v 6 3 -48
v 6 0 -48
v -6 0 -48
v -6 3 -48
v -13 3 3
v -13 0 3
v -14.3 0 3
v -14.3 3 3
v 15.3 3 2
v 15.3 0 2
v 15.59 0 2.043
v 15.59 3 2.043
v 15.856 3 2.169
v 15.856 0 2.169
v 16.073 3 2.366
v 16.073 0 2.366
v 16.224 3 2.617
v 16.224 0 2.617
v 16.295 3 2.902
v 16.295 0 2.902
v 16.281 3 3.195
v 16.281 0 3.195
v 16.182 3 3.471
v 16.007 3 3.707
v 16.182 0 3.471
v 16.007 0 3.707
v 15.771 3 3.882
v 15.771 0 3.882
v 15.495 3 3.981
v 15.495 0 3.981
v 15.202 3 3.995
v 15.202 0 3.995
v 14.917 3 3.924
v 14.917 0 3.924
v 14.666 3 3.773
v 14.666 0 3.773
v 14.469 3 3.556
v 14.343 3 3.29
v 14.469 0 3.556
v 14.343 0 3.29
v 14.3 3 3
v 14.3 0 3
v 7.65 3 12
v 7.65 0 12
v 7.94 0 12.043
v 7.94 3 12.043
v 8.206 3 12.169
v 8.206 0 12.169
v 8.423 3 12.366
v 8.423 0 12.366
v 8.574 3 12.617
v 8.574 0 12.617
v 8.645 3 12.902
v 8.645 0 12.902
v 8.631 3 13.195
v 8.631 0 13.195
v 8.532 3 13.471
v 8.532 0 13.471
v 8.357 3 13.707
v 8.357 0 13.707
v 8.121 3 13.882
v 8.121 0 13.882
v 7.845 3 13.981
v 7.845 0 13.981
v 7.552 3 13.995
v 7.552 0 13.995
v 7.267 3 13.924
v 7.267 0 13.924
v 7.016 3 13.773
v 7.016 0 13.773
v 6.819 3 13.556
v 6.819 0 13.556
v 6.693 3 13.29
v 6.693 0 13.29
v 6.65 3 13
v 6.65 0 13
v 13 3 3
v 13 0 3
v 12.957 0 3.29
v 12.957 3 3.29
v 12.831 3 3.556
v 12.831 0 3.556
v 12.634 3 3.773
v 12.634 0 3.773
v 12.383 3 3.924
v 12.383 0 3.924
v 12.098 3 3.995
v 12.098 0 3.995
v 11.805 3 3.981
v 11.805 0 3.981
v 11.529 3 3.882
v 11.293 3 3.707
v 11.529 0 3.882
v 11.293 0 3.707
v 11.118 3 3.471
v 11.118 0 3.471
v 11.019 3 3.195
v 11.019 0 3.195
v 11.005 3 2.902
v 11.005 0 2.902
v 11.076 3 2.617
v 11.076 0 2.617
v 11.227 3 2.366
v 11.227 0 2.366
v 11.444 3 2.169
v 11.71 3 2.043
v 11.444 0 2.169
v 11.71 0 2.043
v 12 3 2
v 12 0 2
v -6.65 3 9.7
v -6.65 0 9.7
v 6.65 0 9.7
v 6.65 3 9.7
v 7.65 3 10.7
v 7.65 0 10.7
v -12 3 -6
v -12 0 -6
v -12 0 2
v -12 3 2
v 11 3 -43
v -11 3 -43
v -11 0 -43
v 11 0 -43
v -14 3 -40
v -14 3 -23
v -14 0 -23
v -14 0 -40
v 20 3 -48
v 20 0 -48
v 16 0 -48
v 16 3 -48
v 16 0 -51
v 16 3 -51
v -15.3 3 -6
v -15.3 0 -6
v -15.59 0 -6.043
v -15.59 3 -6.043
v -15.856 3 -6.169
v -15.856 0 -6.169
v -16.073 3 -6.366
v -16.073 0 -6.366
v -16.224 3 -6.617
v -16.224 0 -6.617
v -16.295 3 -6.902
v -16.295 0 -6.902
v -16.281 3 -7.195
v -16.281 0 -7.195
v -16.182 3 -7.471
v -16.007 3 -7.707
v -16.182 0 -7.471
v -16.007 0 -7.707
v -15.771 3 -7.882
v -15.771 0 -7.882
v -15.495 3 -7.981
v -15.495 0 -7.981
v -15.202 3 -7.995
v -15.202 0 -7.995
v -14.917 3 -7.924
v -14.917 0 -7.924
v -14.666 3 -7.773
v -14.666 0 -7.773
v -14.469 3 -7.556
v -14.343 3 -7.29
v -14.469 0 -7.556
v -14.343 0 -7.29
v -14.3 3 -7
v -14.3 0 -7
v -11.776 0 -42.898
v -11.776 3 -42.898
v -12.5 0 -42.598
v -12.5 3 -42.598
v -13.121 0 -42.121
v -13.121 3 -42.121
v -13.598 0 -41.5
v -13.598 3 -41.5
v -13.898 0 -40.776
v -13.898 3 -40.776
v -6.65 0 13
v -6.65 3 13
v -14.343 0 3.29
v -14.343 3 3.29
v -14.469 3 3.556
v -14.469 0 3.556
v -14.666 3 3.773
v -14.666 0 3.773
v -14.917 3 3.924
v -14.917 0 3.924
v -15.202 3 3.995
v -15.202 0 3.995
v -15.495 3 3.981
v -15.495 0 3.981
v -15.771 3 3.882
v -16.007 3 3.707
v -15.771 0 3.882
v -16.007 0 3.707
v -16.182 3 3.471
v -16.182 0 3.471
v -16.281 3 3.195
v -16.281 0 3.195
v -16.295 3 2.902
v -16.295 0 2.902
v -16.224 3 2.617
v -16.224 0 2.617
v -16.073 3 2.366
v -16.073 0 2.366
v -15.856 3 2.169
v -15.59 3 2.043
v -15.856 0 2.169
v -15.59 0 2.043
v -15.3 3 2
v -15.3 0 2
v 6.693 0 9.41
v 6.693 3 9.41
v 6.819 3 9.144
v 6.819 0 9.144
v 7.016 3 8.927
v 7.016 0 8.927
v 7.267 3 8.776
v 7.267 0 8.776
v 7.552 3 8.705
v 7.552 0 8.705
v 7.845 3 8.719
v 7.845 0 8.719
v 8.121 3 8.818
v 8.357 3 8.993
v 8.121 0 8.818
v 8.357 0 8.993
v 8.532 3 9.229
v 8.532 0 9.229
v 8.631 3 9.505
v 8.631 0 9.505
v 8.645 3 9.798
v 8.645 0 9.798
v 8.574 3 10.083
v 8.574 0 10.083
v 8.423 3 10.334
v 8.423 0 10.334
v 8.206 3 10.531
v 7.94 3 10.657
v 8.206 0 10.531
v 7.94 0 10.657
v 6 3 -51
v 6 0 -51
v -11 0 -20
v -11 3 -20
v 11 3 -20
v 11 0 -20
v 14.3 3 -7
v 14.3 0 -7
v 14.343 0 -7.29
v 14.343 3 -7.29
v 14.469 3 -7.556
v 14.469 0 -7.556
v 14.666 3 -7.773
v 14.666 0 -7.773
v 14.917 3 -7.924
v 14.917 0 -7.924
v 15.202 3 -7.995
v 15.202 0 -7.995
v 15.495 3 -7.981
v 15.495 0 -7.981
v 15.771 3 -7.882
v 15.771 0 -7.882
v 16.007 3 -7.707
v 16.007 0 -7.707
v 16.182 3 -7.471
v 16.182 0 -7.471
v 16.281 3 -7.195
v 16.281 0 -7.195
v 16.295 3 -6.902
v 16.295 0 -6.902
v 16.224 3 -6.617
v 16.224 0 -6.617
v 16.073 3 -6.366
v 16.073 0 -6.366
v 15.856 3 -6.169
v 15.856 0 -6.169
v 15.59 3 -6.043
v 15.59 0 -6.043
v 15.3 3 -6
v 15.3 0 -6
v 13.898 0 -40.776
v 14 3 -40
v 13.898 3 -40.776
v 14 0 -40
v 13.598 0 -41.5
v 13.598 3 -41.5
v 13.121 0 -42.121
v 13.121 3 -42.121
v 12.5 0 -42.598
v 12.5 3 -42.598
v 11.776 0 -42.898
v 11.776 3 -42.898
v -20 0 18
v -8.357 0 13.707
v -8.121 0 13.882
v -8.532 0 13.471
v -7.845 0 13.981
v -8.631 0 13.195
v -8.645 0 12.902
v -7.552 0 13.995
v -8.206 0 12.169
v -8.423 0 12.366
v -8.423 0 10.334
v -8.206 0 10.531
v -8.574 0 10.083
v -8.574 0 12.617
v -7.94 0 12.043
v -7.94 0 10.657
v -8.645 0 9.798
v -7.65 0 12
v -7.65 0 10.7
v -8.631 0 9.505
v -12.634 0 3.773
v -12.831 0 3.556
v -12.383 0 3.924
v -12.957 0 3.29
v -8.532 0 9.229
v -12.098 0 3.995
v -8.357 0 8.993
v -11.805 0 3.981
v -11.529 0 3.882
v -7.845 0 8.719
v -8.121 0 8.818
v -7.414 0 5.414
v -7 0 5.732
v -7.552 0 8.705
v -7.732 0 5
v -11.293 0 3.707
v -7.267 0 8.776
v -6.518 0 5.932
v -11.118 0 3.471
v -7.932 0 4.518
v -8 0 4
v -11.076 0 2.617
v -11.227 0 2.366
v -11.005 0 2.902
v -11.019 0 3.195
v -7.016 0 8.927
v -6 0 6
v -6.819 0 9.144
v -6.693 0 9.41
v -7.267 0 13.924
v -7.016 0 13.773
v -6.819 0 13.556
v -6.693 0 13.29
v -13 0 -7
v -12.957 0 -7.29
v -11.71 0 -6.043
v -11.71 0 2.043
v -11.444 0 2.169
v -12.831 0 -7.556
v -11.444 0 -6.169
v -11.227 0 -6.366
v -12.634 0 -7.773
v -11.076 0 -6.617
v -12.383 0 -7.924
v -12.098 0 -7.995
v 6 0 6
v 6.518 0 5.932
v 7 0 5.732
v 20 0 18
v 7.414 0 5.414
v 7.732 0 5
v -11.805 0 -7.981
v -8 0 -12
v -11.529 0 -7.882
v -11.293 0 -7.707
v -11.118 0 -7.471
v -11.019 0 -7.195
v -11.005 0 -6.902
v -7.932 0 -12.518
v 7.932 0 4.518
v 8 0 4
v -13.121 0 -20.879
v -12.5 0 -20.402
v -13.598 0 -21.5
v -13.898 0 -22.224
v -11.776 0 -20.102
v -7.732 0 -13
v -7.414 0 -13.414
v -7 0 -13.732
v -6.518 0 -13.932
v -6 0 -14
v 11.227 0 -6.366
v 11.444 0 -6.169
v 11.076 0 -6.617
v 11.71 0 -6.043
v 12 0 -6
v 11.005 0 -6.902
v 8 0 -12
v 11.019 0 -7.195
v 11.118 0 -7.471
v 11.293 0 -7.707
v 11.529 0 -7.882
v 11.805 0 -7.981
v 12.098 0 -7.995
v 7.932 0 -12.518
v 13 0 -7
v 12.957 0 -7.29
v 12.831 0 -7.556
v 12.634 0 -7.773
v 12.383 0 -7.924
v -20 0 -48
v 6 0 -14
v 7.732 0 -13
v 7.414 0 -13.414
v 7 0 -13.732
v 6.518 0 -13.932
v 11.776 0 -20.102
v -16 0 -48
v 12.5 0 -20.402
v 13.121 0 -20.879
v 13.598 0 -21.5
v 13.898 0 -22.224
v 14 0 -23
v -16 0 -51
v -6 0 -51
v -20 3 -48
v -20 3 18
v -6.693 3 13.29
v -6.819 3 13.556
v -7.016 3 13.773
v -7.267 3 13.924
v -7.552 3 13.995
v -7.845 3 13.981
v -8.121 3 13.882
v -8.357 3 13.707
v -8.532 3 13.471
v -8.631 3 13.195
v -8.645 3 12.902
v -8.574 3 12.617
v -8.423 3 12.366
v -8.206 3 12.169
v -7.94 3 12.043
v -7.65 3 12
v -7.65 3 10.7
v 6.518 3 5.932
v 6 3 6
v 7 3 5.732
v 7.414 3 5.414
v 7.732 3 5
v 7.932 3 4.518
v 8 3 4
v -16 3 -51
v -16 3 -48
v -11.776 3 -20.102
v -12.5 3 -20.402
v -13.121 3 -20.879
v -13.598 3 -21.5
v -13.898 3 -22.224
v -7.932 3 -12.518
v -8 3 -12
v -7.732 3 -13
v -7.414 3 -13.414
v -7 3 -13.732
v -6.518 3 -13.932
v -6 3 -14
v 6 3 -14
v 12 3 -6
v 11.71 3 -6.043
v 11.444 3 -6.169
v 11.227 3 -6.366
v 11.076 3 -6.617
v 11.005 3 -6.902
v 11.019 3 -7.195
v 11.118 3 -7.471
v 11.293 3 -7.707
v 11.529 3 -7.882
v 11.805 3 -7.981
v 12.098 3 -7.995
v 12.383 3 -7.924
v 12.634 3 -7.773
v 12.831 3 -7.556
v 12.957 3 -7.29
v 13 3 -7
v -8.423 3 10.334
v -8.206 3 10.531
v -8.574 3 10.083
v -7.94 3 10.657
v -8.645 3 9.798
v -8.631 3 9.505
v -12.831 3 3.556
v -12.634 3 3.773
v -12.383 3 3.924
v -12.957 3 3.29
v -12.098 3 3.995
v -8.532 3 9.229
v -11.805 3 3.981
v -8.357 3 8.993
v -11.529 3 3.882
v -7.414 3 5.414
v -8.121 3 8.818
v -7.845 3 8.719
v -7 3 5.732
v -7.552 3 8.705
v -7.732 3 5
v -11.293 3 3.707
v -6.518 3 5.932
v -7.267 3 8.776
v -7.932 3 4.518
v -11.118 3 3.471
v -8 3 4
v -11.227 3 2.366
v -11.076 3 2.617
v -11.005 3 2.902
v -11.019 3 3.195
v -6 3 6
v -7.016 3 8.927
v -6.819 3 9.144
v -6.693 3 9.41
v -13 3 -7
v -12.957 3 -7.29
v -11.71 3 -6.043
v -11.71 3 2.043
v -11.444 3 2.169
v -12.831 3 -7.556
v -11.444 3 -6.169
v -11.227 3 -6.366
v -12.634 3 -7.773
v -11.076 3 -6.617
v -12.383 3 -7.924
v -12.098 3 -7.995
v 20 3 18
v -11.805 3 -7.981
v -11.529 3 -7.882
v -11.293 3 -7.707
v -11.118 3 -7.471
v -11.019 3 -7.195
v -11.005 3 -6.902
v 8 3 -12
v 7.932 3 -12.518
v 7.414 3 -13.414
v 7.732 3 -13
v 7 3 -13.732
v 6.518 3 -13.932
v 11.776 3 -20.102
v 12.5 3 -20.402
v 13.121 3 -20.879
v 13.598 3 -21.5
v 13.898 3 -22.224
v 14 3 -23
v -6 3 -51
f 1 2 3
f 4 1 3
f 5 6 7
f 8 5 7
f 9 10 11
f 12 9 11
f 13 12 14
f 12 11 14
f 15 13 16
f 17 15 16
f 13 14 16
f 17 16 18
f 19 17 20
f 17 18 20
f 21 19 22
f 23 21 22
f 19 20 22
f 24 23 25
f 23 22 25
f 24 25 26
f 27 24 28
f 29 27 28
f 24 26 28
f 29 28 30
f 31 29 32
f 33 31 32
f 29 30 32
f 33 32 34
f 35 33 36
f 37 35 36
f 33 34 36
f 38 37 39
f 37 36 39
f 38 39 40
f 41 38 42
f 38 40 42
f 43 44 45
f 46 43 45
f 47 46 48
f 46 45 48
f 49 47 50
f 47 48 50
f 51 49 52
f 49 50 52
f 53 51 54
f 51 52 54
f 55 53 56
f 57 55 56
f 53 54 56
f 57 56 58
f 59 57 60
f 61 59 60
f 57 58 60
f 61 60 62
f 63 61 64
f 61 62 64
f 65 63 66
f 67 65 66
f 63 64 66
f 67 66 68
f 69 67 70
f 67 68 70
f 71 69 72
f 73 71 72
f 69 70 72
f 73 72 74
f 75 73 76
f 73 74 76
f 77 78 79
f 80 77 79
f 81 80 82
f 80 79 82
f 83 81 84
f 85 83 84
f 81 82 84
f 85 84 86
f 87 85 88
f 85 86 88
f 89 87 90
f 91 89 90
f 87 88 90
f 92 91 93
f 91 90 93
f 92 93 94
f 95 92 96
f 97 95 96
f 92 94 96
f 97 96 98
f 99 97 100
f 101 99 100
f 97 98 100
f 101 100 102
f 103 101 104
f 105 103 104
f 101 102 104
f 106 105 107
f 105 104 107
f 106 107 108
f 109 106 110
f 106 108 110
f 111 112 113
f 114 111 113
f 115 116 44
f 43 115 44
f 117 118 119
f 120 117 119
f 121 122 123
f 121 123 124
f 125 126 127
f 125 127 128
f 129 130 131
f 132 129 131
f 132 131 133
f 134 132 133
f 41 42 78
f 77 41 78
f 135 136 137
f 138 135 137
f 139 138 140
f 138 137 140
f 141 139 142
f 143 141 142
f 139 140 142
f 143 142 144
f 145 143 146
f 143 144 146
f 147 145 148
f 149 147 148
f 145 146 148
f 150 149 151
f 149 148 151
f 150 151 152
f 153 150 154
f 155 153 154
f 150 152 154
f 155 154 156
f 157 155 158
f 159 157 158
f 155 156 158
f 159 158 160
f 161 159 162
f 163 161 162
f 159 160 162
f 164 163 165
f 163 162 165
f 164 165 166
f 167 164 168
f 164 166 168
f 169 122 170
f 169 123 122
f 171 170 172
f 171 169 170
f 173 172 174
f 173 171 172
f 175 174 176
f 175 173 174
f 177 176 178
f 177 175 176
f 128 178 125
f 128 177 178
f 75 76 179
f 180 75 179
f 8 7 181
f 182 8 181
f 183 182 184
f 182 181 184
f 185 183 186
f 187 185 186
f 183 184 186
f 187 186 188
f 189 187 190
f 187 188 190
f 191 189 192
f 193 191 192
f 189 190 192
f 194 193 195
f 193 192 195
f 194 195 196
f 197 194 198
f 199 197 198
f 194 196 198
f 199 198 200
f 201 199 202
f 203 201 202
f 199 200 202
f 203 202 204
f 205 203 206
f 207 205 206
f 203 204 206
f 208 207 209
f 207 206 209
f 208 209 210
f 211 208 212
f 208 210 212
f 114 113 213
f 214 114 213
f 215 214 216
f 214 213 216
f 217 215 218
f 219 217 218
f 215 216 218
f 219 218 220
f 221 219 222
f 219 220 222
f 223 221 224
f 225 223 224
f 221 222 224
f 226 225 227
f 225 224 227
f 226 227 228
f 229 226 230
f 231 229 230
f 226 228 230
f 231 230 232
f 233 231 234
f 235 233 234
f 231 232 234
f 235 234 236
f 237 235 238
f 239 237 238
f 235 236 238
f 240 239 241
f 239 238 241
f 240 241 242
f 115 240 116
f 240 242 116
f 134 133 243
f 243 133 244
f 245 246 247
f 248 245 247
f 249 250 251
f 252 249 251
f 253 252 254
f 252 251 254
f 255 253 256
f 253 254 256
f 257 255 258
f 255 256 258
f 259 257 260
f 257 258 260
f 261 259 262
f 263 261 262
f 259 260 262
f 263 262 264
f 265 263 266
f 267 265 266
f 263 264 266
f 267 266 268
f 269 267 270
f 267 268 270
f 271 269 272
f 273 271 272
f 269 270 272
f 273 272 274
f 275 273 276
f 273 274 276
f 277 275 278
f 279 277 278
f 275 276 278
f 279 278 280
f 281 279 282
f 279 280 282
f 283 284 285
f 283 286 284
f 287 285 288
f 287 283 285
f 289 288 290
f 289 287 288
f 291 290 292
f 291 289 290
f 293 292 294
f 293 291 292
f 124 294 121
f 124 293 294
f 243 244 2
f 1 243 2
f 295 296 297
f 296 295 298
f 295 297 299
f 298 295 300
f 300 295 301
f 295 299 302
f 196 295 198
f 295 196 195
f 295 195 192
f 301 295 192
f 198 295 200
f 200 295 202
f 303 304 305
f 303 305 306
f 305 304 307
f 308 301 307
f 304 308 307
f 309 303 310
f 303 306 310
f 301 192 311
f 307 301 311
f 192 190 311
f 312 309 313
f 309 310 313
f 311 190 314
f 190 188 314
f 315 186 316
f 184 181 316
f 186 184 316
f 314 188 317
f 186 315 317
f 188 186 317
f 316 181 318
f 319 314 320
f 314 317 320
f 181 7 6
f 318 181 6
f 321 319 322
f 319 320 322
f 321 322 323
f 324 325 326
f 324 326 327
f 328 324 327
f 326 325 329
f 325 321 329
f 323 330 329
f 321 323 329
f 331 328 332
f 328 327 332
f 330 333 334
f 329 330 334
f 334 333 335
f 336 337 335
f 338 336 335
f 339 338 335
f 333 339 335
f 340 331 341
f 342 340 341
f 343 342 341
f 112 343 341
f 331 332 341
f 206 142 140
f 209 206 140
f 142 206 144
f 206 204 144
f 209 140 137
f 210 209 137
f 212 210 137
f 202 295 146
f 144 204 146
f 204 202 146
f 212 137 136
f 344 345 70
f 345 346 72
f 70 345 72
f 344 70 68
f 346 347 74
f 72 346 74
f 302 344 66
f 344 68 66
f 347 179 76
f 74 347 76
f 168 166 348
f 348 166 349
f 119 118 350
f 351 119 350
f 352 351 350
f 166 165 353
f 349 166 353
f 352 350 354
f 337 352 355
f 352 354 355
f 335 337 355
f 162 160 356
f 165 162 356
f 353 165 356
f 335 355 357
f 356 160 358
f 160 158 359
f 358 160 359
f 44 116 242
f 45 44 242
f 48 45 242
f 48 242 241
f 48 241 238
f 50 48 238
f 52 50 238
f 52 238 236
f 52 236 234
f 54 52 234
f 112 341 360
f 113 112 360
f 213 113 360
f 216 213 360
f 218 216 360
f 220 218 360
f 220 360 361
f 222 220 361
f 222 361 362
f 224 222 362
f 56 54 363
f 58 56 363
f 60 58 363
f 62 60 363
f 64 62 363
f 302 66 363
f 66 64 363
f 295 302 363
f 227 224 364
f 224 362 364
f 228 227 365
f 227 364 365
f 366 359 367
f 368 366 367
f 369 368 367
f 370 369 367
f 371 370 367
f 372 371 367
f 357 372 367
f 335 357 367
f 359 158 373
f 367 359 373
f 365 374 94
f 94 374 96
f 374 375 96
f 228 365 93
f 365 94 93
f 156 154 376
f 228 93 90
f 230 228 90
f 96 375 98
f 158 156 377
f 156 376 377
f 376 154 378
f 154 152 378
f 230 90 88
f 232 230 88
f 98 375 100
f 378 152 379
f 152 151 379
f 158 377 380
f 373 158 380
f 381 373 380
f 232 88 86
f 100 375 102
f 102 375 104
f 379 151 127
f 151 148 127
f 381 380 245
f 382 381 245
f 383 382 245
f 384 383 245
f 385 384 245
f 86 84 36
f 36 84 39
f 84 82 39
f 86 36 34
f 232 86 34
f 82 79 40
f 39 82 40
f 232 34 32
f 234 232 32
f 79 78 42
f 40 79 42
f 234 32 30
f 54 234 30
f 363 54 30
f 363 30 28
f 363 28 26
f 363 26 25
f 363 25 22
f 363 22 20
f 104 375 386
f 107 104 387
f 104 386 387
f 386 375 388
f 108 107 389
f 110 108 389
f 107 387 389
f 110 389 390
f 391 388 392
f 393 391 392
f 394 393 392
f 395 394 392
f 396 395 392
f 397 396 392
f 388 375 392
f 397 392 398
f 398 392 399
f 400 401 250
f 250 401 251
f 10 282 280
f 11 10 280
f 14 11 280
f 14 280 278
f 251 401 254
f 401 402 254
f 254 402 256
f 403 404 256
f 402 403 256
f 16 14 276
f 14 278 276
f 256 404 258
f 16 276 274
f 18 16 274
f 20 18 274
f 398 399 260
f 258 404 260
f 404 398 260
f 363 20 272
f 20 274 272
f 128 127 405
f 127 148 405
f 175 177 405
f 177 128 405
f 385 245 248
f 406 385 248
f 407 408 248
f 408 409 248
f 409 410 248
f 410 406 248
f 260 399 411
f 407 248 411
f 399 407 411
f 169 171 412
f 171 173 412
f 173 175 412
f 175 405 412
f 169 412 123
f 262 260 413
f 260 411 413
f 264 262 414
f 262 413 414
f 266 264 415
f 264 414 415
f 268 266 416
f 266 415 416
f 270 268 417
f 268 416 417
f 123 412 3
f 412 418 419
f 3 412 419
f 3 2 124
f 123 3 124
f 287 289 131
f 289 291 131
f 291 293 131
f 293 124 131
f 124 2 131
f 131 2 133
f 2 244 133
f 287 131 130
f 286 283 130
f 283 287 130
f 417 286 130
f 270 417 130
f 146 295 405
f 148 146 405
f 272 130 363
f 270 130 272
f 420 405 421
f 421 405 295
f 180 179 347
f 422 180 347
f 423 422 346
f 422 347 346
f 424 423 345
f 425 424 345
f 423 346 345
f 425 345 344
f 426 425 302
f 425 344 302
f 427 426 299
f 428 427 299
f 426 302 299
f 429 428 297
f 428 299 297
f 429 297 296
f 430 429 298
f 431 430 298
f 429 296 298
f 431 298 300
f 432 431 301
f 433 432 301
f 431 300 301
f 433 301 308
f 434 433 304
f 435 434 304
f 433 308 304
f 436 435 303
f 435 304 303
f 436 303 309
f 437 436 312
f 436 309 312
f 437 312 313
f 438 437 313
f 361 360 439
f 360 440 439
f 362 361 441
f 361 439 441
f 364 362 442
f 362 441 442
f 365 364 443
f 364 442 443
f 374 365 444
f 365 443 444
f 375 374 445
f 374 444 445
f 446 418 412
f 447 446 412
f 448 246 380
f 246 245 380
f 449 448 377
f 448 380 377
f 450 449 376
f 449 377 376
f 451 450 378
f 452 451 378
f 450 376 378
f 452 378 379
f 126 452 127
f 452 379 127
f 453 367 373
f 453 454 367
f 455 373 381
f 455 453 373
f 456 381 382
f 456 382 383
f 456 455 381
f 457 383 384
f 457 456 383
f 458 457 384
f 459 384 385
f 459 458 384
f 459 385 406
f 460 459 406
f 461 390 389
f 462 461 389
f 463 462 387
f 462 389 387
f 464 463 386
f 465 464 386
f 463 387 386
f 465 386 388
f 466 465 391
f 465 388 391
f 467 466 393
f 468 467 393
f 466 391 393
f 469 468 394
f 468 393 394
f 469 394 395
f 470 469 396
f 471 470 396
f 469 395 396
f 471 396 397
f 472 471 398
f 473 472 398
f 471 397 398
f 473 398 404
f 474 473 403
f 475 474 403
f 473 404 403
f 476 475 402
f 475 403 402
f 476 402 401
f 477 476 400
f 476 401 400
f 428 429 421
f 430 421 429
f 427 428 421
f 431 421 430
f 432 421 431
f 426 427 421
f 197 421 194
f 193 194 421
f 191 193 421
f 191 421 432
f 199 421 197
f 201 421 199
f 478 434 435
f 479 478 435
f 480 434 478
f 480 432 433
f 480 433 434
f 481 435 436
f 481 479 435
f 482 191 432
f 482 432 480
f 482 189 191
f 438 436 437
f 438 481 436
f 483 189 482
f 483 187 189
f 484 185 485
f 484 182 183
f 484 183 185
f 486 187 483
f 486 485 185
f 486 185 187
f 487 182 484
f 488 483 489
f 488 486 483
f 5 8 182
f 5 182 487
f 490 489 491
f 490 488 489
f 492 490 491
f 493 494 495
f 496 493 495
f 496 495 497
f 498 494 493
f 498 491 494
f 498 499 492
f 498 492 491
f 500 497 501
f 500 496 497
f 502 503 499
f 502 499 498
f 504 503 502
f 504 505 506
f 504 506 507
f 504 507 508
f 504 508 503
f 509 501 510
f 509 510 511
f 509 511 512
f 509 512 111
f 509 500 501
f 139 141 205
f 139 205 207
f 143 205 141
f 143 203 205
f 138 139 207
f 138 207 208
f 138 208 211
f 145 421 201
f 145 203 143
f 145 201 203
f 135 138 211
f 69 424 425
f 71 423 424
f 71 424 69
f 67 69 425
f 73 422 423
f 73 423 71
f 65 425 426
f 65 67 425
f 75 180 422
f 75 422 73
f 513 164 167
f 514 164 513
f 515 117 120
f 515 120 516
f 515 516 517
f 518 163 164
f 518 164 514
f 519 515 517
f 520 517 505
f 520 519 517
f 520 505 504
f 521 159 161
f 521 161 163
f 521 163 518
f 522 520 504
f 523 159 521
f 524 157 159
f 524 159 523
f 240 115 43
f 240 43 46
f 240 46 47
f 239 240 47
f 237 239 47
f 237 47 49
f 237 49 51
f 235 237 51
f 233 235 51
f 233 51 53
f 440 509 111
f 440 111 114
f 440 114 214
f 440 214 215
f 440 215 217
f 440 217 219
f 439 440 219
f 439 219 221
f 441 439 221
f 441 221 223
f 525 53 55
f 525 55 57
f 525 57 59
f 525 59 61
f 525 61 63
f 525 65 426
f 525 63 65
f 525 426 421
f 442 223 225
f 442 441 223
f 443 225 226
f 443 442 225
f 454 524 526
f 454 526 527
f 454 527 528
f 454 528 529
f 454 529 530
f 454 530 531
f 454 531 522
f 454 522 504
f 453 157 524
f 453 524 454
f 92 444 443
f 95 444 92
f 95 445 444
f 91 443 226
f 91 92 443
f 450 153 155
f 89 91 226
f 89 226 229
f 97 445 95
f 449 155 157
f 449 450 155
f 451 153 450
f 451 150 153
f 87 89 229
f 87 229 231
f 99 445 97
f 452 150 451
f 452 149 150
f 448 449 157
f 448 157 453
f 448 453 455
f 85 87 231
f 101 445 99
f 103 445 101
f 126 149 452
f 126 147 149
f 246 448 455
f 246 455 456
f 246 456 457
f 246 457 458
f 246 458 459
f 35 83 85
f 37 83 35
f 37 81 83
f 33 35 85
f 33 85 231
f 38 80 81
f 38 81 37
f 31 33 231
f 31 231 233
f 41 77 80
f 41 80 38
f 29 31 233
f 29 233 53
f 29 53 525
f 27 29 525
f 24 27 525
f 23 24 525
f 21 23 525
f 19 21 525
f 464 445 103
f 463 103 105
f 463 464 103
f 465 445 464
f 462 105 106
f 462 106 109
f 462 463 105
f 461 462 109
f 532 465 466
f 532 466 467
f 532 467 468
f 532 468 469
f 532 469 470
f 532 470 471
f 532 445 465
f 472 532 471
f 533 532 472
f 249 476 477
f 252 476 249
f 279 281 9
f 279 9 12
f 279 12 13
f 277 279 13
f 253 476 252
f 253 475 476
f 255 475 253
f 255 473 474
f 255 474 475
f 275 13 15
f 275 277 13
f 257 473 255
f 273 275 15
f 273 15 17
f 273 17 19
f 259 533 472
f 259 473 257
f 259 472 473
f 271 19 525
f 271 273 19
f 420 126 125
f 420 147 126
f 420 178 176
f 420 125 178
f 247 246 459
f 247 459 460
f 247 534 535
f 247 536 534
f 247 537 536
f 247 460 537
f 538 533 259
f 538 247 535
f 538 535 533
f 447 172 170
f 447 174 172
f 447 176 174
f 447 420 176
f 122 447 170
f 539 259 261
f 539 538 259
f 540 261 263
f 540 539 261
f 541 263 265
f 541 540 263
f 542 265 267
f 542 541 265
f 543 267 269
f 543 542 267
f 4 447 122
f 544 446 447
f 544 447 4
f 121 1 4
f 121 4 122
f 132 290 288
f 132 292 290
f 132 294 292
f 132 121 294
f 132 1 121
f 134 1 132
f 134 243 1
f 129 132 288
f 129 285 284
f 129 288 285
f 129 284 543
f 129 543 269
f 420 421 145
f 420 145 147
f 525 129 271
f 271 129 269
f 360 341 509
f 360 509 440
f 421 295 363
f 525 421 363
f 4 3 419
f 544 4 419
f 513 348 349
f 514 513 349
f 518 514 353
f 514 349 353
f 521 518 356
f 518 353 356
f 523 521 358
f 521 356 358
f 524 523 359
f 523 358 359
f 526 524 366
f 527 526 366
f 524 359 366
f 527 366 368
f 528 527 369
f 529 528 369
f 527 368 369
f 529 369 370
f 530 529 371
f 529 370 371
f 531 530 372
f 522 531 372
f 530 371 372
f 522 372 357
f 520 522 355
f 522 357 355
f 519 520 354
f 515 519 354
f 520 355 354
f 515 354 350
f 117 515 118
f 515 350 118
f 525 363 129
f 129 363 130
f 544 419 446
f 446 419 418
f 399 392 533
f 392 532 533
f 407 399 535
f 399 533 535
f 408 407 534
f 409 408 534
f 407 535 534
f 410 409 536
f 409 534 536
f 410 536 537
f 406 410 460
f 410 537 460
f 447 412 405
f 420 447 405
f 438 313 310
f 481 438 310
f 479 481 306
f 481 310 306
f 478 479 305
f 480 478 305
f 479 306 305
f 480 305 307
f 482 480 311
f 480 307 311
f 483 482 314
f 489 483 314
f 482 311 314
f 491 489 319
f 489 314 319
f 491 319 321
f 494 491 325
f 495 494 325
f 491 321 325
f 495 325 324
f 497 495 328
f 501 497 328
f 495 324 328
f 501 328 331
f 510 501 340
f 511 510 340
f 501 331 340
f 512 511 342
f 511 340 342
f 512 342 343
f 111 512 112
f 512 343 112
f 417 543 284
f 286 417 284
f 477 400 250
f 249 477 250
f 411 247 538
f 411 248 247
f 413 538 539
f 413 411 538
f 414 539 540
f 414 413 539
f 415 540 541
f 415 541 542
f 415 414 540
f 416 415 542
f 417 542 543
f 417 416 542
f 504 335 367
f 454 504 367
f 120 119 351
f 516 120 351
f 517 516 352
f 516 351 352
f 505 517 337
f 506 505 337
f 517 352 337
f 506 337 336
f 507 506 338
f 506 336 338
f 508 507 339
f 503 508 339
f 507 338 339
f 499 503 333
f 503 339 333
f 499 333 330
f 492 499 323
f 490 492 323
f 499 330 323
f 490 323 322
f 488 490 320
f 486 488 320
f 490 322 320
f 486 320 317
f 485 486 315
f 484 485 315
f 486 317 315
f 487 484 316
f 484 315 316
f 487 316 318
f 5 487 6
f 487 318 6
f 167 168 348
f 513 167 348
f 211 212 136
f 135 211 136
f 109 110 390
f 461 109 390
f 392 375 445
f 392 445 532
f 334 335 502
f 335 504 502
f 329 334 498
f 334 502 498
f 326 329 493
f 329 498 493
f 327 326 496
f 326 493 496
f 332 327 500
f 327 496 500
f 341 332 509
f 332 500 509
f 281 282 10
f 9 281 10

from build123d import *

# Parameters (mm, degrees)
EXTRUDE_1_DEPTH          = 3
CUT_EXTRUDE_1_DEPTH      = 55.863466897
CUT_EXTRUDE_1_DEPTH_BACK = 55.863466897
SKETCH_2_W               = 16
SKETCH_2_H               = 20
FILLET_1_R               = 2
SKETCH_3_W               = 28
SKETCH_3_H               = 23
CUT_EXTRUDE_2_DEPTH      = 10
FILLET_2_R               = 3


with BuildPart() as part:
    # 草图1 → 凸台-拉伸1 (new body)
    with BuildSketch(Plane(origin=(0, 0, 0), x_dir=(1, 0, 0), z_dir=(0, 1, 0))):
        Polygon((20, 48), (16, 48), (16, 51), (6, 51), (6, 48), (-6, 48), (-6, 51), (-16, 51), (-16, 48), (-20, 48), (-20, -18), (20, -18), align=None)
        with BuildLine():
            Line((15.3, 6), (15.3, -2))
            ThreePointArc((15.3, -2), (16.007106781, -3.707106781), (14.3, -3))
            Line((14.3, -3), (13, -3))
            ThreePointArc((13, -3), (11.292893219, -3.707106781), (12, -2))
            Line((12, -2), (12, 6))
            ThreePointArc((12, 6), (11.292893219, 7.707106781), (13, 7))
            Line((13, 7), (14.3, 7))
            ThreePointArc((14.3, 7), (16.007106781, 7.707106781), (15.3, 6))
        make_face(mode=Mode.SUBTRACT)
        with BuildLine():
            Line((-12, 6), (-12, -2))
            ThreePointArc((-12, -2), (-11.292893219, -3.707106781), (-13, -3))
            Line((-13, -3), (-14.3, -3))
            ThreePointArc((-14.3, -3), (-16.007106781, -3.707106781), (-15.3, -2))
            Line((-15.3, -2), (-15.3, 6))
            ThreePointArc((-15.3, 6), (-16.007106781, 7.707106781), (-14.3, 7))
            Line((-14.3, 7), (-13, 7))
            ThreePointArc((-13, 7), (-11.292893219, 7.707106781), (-12, 6))
        make_face(mode=Mode.SUBTRACT)
        with BuildLine():
            Line((-7.65, -12), (-7.65, -10.7))
            ThreePointArc((-7.65, -10.7), (-8.357106781, -8.992893219), (-6.65, -9.7))
            Line((-6.65, -9.7), (6.65, -9.7))
            ThreePointArc((6.65, -9.7), (8.357106781, -8.992893219), (7.65, -10.7))
            Line((7.65, -10.7), (7.65, -12))
            ThreePointArc((7.65, -12), (8.357106781, -13.707106781), (6.65, -13))
            Line((6.65, -13), (-6.65, -13))
            ThreePointArc((-6.65, -13), (-8.357106781, -13.707106781), (-7.65, -12))
        make_face(mode=Mode.SUBTRACT)
    extrude(amount=EXTRUDE_1_DEPTH)

    # 草图2 → 切除-拉伸1 (cut, two sides: drawn at the far end of the back side and taken through both)
    with BuildSketch(Plane(origin=(0, 3, 0), x_dir=(1, 0, 0), z_dir=(0, 1, 0)).offset(-CUT_EXTRUDE_1_DEPTH_BACK)):
        with Locations((0, 4)):
            Rectangle(SKETCH_2_W, SKETCH_2_H)
    extrude(amount=CUT_EXTRUDE_1_DEPTH + CUT_EXTRUDE_1_DEPTH_BACK, mode=Mode.SUBTRACT)

    # 圆角1
    fillet_1_edges = [part.edges().sort_by_distance(p)[0] for p in [
        (8, 1.5, -14),
        (8, 1.5, 6),
        (-8, 1.5, 6),
        (-8, 1.5, -14),
    ]]
    fillet(fillet_1_edges, radius=FILLET_1_R)

    # 草图3 → 切除-拉伸2 (cut)
    with BuildSketch(Plane(origin=(0, 3, 0), x_dir=(1, 0, 0), z_dir=(0, 1, 0))):
        with Locations((0, 31.5)):
            Rectangle(SKETCH_3_W, SKETCH_3_H)
    extrude(amount=-CUT_EXTRUDE_2_DEPTH, mode=Mode.SUBTRACT)

    # 圆角2
    fillet_2_edges = [part.edges().sort_by_distance(p)[0] for p in [
        (14, 1.5, -43),
        (14, 1.5, -20),
        (-14, 1.5, -20),
        (-14, 1.5, -43),
    ]]
    fillet(fillet_2_edges, radius=FILLET_2_R)


solid = part.part
